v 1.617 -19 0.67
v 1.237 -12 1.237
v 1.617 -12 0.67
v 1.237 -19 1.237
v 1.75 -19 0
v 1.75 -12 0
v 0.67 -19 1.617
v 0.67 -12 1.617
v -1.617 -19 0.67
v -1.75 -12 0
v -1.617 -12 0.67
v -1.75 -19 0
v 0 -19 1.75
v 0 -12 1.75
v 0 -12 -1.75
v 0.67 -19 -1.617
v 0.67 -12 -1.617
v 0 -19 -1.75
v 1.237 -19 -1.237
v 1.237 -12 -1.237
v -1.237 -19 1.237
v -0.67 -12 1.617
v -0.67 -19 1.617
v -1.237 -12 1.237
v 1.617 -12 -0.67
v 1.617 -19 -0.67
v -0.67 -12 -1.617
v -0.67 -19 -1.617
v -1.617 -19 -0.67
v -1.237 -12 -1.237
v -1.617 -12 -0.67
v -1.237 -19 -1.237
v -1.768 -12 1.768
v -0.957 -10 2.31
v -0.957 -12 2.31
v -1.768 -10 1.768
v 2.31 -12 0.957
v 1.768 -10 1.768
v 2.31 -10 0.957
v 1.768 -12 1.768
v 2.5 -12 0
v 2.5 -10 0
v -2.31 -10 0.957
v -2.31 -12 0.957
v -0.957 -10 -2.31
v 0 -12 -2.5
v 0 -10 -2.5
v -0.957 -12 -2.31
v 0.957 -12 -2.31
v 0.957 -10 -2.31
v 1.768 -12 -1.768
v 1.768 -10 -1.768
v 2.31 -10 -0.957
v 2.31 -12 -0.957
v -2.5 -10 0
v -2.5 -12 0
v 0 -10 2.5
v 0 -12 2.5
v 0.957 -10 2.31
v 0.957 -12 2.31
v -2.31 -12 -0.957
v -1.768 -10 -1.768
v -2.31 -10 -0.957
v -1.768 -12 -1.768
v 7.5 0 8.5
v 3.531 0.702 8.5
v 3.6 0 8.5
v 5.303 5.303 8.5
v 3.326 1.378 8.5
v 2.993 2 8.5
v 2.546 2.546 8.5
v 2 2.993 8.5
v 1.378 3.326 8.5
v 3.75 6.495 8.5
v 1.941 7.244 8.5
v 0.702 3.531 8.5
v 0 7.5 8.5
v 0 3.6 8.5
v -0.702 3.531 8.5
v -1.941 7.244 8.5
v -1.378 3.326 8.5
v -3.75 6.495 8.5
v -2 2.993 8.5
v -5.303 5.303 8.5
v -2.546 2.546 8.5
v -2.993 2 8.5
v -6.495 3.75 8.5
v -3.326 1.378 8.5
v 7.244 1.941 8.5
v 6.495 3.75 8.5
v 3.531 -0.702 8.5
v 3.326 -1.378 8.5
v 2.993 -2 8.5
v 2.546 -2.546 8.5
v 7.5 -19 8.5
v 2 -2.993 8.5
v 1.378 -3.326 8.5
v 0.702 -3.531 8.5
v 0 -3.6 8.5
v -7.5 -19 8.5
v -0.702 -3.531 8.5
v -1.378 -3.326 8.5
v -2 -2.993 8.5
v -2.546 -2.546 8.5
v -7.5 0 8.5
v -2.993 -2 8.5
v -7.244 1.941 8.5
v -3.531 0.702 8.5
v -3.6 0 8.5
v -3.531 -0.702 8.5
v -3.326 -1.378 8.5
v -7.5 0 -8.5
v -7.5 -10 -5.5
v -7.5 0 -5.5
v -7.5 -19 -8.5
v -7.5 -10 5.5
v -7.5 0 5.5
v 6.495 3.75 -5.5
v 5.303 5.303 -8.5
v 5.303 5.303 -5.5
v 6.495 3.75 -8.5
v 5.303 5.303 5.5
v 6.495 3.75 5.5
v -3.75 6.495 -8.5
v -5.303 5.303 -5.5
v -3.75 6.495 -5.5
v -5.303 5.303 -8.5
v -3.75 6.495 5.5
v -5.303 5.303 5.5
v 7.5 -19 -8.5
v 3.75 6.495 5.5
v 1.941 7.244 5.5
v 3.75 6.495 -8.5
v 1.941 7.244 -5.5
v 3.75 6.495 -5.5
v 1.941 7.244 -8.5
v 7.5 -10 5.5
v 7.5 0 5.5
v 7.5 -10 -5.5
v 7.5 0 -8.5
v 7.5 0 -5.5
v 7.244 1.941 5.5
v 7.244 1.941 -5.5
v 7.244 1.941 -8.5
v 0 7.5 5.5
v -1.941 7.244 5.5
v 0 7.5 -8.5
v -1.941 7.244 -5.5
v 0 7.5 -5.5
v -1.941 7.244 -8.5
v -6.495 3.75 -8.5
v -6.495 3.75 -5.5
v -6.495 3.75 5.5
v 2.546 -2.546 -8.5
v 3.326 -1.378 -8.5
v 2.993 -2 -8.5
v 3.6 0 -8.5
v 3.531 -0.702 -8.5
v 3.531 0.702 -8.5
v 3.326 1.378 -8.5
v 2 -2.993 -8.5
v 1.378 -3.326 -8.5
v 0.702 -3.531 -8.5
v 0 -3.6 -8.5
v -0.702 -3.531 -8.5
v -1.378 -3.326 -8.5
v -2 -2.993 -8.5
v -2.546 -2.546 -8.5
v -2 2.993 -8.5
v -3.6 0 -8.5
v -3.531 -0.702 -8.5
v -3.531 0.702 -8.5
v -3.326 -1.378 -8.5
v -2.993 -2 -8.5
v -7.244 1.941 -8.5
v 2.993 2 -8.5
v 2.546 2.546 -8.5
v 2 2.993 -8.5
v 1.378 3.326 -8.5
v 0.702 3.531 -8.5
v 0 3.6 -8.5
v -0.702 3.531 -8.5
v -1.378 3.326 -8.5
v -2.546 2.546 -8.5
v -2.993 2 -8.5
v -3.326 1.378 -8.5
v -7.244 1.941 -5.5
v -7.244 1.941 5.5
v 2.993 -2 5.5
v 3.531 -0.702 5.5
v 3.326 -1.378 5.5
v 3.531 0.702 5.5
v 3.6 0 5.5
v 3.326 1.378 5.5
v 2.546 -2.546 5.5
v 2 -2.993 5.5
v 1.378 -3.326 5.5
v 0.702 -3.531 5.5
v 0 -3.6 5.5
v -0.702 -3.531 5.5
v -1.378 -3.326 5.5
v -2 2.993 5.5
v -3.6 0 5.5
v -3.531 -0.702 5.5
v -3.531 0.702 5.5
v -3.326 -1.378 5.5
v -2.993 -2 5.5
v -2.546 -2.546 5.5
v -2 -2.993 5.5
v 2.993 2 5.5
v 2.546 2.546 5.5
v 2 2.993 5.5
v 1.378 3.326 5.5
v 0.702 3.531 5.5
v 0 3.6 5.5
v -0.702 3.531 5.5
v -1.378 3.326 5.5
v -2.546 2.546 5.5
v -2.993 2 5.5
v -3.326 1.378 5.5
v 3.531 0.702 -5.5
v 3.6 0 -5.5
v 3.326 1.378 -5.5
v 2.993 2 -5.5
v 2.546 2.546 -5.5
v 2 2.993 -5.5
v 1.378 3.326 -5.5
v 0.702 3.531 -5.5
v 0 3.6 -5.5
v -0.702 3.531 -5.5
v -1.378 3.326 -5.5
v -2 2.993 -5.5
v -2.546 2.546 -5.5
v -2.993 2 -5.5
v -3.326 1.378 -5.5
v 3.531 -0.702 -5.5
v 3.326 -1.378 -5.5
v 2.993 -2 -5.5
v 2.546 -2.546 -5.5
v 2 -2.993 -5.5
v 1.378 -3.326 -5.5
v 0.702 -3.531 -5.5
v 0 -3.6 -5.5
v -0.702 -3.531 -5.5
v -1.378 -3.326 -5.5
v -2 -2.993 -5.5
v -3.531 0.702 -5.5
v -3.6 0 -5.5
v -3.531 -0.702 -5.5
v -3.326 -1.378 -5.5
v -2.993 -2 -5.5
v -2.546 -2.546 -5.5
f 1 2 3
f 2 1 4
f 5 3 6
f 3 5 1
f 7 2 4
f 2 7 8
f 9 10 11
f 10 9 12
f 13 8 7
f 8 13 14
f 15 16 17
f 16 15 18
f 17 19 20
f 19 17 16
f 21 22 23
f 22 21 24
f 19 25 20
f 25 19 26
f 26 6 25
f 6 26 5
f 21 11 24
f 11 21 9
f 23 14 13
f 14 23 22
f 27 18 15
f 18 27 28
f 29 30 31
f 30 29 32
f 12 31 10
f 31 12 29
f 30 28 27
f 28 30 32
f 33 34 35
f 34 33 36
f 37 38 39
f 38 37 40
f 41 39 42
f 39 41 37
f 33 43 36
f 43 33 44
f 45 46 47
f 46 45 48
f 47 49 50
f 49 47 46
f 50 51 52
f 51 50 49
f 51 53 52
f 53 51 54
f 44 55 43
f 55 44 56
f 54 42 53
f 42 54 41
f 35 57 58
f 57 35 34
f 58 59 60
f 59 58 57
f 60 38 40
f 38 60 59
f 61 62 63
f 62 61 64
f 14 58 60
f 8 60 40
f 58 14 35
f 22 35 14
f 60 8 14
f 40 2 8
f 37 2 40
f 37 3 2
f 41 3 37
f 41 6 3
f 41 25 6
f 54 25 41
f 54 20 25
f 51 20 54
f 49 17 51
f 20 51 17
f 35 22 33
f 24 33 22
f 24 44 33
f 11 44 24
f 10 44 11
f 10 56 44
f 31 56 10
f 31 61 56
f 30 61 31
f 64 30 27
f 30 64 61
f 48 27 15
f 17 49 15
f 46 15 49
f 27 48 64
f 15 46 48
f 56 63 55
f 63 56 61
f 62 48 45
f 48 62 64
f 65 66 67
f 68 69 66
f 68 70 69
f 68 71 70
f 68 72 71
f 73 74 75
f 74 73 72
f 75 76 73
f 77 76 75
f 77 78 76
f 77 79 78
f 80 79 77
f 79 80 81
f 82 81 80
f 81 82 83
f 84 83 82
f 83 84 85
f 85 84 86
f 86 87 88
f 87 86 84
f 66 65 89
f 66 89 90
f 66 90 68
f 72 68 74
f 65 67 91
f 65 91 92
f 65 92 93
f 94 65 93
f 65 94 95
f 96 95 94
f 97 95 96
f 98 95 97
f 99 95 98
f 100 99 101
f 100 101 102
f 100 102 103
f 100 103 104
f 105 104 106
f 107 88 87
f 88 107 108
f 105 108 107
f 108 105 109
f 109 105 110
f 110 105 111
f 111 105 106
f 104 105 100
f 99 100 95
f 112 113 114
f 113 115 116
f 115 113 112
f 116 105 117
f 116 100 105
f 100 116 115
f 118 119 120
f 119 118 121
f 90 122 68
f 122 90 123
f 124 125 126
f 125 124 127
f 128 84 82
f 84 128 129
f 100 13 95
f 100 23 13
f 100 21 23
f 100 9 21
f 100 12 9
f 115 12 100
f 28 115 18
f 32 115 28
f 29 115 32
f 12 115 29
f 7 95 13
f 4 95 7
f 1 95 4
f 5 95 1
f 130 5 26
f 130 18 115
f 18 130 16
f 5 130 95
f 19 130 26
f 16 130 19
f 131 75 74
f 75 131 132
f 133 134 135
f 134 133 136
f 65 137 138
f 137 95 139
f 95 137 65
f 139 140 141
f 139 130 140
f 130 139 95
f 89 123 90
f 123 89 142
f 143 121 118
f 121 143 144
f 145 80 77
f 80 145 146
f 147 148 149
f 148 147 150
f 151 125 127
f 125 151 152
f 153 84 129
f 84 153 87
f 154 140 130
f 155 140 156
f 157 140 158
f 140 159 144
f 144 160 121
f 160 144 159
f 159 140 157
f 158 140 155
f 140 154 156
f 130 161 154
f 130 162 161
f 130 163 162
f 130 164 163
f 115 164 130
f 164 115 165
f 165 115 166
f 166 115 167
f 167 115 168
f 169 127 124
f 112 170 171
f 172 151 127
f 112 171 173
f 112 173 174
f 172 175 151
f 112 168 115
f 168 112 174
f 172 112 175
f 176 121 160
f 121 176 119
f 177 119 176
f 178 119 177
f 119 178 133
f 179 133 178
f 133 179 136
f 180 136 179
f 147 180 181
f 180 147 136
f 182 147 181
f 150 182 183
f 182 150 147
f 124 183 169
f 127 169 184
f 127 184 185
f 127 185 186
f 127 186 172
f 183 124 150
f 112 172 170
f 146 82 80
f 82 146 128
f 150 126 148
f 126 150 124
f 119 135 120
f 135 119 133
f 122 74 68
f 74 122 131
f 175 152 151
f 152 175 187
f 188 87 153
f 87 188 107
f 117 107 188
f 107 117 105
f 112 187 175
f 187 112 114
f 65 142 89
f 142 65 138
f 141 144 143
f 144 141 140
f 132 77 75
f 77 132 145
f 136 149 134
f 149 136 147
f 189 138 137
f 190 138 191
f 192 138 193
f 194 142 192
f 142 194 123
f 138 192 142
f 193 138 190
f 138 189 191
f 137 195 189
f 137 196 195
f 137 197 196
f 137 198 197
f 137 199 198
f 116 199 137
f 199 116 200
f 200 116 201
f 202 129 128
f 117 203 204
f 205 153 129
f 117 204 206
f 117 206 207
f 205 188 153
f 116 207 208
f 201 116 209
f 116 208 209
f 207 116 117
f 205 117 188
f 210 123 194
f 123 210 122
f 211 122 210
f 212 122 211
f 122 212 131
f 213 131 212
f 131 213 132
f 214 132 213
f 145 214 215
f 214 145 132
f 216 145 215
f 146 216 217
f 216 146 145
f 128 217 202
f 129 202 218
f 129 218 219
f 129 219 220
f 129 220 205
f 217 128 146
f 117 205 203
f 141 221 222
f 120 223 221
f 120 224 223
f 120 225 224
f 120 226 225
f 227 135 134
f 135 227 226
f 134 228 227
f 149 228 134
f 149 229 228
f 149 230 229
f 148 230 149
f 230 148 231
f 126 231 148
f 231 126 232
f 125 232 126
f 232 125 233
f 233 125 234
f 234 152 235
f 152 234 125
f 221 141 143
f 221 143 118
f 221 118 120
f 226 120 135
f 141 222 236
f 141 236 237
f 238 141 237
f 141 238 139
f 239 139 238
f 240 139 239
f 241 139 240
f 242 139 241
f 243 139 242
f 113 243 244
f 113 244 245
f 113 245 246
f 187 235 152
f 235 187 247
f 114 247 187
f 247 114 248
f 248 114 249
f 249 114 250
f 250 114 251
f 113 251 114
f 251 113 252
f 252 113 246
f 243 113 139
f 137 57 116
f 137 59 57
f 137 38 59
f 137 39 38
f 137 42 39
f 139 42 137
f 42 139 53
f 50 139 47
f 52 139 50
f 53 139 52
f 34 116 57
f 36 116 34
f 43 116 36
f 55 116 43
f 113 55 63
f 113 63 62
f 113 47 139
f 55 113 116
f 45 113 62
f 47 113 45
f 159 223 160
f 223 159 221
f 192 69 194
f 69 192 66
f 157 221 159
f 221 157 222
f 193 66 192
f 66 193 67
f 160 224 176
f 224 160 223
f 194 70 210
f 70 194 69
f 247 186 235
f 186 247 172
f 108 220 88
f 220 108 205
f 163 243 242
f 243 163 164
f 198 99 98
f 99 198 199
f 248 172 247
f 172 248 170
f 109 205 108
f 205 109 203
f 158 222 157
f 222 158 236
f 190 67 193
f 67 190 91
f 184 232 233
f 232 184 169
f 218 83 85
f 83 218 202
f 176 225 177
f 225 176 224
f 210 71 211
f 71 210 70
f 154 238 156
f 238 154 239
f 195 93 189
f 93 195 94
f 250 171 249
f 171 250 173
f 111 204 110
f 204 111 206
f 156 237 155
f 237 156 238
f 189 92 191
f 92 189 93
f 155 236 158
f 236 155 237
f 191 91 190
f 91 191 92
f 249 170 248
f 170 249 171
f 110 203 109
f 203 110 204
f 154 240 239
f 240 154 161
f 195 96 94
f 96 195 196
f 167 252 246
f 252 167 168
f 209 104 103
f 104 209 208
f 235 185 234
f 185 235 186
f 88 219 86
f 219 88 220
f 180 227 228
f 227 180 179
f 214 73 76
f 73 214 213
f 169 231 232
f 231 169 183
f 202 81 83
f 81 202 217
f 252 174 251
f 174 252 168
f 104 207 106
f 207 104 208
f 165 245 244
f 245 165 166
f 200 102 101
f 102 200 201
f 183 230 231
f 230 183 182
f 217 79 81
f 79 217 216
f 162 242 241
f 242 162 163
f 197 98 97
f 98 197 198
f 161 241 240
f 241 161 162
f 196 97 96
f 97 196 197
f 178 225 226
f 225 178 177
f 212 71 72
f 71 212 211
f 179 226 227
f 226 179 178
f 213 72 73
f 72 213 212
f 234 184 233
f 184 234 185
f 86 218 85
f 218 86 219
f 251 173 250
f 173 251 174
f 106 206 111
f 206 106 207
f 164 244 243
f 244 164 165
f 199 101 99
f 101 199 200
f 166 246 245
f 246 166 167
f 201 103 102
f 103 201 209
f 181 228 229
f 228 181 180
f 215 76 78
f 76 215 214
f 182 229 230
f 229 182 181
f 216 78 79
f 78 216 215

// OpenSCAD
// file: config.scad
lever_thickness = 5;
layer_spacing = 6;

mount_thickness = 6;

pot_shaft_diameter = 6;
pot_mount_diameter = 7.2;

mount_screw_diameter = 3.5;
mount_screw_cutout_diameter = 5;
// main file
include <config.scad>

module Mount()
{
  dim = 15;

  difference()
  {
    linear_extrude(lever_thickness + layer_spacing + mount_thickness, center=true)
    {
      hull()
      {
        circle(d=dim);

        translate([0, -10])
        {
          square([dim, 18], center=true);
        }
      }
    }

    cube([16, 20, lever_thickness + layer_spacing], center=true);

    cylinder(h=50, d=pot_mount_diameter, center=true, $fn=32);

    rotate([90, 0, 0])
    {
      cylinder(h=50, d=mount_screw_diameter, $fn=16);
      cylinder(h=12, d=mount_screw_cutout_diameter, $fn=16);
    }
  }
}

Mount();
